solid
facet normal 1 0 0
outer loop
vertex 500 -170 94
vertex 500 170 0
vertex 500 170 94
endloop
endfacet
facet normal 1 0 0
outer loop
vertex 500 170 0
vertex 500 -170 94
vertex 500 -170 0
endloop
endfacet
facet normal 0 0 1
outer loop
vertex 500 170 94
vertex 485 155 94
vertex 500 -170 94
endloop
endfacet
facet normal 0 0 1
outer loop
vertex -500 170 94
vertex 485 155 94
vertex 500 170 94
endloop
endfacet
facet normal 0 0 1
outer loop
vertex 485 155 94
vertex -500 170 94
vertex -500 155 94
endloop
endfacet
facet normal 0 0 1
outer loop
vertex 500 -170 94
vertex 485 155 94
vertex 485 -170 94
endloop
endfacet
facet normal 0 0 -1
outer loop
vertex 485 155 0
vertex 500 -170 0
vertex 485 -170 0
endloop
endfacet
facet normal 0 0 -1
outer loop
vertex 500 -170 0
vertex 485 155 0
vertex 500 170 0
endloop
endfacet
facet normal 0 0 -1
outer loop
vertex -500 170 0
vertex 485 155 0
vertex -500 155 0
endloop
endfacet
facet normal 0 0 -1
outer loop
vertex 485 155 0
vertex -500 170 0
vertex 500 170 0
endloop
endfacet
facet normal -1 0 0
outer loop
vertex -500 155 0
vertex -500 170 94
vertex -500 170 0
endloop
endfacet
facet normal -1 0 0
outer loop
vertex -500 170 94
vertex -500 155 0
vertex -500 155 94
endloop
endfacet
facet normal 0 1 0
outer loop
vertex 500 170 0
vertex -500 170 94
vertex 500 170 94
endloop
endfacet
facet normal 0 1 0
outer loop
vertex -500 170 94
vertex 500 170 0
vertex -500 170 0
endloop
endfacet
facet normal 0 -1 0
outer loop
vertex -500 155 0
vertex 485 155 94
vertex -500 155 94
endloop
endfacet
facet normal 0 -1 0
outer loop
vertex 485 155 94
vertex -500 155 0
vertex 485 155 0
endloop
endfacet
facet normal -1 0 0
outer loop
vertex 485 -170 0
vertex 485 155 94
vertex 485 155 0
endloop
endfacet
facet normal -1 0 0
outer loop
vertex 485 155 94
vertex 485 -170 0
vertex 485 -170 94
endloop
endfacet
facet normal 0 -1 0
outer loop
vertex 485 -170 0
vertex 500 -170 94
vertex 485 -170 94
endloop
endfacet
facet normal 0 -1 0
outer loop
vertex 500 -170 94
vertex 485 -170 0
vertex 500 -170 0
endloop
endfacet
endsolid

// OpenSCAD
// file: terracerailing.scad
module terracerailing(width=300, length=800, railing_thickness=15, railing_height=260) 
{
    translate([0,width/2-railing_thickness/2, railing_height/2]) cube([length, railing_thickness, railing_height],center=true);
        
    /* translate([0,-width/2+railing_thickness/2, railing_height/2]) cube([length, railing_thickness, railing_height],center=true); */
    
    translate([length/2-railing_thickness/2, 0, railing_height/2]) cube([railing_thickness, width, railing_height],center=true);
    
    /* translate([-length/2+railing_thickness/2, 0, railing_height/2]) cube([railing_thickness, width, railing_height],center=true); */
}

terracerailing();
// main file
 use <terracerailing.scad>

module terrace(width=340, length=1000, railing_thickness=15, railing_height=94,railing_color=[255/255, 255/255, 255/255],railing_alpha=1.0) 
{
    color (railing_color,railing_alpha)
    terracerailing(width, length, railing_thickness, railing_height);
}

// For testing
terrace();
